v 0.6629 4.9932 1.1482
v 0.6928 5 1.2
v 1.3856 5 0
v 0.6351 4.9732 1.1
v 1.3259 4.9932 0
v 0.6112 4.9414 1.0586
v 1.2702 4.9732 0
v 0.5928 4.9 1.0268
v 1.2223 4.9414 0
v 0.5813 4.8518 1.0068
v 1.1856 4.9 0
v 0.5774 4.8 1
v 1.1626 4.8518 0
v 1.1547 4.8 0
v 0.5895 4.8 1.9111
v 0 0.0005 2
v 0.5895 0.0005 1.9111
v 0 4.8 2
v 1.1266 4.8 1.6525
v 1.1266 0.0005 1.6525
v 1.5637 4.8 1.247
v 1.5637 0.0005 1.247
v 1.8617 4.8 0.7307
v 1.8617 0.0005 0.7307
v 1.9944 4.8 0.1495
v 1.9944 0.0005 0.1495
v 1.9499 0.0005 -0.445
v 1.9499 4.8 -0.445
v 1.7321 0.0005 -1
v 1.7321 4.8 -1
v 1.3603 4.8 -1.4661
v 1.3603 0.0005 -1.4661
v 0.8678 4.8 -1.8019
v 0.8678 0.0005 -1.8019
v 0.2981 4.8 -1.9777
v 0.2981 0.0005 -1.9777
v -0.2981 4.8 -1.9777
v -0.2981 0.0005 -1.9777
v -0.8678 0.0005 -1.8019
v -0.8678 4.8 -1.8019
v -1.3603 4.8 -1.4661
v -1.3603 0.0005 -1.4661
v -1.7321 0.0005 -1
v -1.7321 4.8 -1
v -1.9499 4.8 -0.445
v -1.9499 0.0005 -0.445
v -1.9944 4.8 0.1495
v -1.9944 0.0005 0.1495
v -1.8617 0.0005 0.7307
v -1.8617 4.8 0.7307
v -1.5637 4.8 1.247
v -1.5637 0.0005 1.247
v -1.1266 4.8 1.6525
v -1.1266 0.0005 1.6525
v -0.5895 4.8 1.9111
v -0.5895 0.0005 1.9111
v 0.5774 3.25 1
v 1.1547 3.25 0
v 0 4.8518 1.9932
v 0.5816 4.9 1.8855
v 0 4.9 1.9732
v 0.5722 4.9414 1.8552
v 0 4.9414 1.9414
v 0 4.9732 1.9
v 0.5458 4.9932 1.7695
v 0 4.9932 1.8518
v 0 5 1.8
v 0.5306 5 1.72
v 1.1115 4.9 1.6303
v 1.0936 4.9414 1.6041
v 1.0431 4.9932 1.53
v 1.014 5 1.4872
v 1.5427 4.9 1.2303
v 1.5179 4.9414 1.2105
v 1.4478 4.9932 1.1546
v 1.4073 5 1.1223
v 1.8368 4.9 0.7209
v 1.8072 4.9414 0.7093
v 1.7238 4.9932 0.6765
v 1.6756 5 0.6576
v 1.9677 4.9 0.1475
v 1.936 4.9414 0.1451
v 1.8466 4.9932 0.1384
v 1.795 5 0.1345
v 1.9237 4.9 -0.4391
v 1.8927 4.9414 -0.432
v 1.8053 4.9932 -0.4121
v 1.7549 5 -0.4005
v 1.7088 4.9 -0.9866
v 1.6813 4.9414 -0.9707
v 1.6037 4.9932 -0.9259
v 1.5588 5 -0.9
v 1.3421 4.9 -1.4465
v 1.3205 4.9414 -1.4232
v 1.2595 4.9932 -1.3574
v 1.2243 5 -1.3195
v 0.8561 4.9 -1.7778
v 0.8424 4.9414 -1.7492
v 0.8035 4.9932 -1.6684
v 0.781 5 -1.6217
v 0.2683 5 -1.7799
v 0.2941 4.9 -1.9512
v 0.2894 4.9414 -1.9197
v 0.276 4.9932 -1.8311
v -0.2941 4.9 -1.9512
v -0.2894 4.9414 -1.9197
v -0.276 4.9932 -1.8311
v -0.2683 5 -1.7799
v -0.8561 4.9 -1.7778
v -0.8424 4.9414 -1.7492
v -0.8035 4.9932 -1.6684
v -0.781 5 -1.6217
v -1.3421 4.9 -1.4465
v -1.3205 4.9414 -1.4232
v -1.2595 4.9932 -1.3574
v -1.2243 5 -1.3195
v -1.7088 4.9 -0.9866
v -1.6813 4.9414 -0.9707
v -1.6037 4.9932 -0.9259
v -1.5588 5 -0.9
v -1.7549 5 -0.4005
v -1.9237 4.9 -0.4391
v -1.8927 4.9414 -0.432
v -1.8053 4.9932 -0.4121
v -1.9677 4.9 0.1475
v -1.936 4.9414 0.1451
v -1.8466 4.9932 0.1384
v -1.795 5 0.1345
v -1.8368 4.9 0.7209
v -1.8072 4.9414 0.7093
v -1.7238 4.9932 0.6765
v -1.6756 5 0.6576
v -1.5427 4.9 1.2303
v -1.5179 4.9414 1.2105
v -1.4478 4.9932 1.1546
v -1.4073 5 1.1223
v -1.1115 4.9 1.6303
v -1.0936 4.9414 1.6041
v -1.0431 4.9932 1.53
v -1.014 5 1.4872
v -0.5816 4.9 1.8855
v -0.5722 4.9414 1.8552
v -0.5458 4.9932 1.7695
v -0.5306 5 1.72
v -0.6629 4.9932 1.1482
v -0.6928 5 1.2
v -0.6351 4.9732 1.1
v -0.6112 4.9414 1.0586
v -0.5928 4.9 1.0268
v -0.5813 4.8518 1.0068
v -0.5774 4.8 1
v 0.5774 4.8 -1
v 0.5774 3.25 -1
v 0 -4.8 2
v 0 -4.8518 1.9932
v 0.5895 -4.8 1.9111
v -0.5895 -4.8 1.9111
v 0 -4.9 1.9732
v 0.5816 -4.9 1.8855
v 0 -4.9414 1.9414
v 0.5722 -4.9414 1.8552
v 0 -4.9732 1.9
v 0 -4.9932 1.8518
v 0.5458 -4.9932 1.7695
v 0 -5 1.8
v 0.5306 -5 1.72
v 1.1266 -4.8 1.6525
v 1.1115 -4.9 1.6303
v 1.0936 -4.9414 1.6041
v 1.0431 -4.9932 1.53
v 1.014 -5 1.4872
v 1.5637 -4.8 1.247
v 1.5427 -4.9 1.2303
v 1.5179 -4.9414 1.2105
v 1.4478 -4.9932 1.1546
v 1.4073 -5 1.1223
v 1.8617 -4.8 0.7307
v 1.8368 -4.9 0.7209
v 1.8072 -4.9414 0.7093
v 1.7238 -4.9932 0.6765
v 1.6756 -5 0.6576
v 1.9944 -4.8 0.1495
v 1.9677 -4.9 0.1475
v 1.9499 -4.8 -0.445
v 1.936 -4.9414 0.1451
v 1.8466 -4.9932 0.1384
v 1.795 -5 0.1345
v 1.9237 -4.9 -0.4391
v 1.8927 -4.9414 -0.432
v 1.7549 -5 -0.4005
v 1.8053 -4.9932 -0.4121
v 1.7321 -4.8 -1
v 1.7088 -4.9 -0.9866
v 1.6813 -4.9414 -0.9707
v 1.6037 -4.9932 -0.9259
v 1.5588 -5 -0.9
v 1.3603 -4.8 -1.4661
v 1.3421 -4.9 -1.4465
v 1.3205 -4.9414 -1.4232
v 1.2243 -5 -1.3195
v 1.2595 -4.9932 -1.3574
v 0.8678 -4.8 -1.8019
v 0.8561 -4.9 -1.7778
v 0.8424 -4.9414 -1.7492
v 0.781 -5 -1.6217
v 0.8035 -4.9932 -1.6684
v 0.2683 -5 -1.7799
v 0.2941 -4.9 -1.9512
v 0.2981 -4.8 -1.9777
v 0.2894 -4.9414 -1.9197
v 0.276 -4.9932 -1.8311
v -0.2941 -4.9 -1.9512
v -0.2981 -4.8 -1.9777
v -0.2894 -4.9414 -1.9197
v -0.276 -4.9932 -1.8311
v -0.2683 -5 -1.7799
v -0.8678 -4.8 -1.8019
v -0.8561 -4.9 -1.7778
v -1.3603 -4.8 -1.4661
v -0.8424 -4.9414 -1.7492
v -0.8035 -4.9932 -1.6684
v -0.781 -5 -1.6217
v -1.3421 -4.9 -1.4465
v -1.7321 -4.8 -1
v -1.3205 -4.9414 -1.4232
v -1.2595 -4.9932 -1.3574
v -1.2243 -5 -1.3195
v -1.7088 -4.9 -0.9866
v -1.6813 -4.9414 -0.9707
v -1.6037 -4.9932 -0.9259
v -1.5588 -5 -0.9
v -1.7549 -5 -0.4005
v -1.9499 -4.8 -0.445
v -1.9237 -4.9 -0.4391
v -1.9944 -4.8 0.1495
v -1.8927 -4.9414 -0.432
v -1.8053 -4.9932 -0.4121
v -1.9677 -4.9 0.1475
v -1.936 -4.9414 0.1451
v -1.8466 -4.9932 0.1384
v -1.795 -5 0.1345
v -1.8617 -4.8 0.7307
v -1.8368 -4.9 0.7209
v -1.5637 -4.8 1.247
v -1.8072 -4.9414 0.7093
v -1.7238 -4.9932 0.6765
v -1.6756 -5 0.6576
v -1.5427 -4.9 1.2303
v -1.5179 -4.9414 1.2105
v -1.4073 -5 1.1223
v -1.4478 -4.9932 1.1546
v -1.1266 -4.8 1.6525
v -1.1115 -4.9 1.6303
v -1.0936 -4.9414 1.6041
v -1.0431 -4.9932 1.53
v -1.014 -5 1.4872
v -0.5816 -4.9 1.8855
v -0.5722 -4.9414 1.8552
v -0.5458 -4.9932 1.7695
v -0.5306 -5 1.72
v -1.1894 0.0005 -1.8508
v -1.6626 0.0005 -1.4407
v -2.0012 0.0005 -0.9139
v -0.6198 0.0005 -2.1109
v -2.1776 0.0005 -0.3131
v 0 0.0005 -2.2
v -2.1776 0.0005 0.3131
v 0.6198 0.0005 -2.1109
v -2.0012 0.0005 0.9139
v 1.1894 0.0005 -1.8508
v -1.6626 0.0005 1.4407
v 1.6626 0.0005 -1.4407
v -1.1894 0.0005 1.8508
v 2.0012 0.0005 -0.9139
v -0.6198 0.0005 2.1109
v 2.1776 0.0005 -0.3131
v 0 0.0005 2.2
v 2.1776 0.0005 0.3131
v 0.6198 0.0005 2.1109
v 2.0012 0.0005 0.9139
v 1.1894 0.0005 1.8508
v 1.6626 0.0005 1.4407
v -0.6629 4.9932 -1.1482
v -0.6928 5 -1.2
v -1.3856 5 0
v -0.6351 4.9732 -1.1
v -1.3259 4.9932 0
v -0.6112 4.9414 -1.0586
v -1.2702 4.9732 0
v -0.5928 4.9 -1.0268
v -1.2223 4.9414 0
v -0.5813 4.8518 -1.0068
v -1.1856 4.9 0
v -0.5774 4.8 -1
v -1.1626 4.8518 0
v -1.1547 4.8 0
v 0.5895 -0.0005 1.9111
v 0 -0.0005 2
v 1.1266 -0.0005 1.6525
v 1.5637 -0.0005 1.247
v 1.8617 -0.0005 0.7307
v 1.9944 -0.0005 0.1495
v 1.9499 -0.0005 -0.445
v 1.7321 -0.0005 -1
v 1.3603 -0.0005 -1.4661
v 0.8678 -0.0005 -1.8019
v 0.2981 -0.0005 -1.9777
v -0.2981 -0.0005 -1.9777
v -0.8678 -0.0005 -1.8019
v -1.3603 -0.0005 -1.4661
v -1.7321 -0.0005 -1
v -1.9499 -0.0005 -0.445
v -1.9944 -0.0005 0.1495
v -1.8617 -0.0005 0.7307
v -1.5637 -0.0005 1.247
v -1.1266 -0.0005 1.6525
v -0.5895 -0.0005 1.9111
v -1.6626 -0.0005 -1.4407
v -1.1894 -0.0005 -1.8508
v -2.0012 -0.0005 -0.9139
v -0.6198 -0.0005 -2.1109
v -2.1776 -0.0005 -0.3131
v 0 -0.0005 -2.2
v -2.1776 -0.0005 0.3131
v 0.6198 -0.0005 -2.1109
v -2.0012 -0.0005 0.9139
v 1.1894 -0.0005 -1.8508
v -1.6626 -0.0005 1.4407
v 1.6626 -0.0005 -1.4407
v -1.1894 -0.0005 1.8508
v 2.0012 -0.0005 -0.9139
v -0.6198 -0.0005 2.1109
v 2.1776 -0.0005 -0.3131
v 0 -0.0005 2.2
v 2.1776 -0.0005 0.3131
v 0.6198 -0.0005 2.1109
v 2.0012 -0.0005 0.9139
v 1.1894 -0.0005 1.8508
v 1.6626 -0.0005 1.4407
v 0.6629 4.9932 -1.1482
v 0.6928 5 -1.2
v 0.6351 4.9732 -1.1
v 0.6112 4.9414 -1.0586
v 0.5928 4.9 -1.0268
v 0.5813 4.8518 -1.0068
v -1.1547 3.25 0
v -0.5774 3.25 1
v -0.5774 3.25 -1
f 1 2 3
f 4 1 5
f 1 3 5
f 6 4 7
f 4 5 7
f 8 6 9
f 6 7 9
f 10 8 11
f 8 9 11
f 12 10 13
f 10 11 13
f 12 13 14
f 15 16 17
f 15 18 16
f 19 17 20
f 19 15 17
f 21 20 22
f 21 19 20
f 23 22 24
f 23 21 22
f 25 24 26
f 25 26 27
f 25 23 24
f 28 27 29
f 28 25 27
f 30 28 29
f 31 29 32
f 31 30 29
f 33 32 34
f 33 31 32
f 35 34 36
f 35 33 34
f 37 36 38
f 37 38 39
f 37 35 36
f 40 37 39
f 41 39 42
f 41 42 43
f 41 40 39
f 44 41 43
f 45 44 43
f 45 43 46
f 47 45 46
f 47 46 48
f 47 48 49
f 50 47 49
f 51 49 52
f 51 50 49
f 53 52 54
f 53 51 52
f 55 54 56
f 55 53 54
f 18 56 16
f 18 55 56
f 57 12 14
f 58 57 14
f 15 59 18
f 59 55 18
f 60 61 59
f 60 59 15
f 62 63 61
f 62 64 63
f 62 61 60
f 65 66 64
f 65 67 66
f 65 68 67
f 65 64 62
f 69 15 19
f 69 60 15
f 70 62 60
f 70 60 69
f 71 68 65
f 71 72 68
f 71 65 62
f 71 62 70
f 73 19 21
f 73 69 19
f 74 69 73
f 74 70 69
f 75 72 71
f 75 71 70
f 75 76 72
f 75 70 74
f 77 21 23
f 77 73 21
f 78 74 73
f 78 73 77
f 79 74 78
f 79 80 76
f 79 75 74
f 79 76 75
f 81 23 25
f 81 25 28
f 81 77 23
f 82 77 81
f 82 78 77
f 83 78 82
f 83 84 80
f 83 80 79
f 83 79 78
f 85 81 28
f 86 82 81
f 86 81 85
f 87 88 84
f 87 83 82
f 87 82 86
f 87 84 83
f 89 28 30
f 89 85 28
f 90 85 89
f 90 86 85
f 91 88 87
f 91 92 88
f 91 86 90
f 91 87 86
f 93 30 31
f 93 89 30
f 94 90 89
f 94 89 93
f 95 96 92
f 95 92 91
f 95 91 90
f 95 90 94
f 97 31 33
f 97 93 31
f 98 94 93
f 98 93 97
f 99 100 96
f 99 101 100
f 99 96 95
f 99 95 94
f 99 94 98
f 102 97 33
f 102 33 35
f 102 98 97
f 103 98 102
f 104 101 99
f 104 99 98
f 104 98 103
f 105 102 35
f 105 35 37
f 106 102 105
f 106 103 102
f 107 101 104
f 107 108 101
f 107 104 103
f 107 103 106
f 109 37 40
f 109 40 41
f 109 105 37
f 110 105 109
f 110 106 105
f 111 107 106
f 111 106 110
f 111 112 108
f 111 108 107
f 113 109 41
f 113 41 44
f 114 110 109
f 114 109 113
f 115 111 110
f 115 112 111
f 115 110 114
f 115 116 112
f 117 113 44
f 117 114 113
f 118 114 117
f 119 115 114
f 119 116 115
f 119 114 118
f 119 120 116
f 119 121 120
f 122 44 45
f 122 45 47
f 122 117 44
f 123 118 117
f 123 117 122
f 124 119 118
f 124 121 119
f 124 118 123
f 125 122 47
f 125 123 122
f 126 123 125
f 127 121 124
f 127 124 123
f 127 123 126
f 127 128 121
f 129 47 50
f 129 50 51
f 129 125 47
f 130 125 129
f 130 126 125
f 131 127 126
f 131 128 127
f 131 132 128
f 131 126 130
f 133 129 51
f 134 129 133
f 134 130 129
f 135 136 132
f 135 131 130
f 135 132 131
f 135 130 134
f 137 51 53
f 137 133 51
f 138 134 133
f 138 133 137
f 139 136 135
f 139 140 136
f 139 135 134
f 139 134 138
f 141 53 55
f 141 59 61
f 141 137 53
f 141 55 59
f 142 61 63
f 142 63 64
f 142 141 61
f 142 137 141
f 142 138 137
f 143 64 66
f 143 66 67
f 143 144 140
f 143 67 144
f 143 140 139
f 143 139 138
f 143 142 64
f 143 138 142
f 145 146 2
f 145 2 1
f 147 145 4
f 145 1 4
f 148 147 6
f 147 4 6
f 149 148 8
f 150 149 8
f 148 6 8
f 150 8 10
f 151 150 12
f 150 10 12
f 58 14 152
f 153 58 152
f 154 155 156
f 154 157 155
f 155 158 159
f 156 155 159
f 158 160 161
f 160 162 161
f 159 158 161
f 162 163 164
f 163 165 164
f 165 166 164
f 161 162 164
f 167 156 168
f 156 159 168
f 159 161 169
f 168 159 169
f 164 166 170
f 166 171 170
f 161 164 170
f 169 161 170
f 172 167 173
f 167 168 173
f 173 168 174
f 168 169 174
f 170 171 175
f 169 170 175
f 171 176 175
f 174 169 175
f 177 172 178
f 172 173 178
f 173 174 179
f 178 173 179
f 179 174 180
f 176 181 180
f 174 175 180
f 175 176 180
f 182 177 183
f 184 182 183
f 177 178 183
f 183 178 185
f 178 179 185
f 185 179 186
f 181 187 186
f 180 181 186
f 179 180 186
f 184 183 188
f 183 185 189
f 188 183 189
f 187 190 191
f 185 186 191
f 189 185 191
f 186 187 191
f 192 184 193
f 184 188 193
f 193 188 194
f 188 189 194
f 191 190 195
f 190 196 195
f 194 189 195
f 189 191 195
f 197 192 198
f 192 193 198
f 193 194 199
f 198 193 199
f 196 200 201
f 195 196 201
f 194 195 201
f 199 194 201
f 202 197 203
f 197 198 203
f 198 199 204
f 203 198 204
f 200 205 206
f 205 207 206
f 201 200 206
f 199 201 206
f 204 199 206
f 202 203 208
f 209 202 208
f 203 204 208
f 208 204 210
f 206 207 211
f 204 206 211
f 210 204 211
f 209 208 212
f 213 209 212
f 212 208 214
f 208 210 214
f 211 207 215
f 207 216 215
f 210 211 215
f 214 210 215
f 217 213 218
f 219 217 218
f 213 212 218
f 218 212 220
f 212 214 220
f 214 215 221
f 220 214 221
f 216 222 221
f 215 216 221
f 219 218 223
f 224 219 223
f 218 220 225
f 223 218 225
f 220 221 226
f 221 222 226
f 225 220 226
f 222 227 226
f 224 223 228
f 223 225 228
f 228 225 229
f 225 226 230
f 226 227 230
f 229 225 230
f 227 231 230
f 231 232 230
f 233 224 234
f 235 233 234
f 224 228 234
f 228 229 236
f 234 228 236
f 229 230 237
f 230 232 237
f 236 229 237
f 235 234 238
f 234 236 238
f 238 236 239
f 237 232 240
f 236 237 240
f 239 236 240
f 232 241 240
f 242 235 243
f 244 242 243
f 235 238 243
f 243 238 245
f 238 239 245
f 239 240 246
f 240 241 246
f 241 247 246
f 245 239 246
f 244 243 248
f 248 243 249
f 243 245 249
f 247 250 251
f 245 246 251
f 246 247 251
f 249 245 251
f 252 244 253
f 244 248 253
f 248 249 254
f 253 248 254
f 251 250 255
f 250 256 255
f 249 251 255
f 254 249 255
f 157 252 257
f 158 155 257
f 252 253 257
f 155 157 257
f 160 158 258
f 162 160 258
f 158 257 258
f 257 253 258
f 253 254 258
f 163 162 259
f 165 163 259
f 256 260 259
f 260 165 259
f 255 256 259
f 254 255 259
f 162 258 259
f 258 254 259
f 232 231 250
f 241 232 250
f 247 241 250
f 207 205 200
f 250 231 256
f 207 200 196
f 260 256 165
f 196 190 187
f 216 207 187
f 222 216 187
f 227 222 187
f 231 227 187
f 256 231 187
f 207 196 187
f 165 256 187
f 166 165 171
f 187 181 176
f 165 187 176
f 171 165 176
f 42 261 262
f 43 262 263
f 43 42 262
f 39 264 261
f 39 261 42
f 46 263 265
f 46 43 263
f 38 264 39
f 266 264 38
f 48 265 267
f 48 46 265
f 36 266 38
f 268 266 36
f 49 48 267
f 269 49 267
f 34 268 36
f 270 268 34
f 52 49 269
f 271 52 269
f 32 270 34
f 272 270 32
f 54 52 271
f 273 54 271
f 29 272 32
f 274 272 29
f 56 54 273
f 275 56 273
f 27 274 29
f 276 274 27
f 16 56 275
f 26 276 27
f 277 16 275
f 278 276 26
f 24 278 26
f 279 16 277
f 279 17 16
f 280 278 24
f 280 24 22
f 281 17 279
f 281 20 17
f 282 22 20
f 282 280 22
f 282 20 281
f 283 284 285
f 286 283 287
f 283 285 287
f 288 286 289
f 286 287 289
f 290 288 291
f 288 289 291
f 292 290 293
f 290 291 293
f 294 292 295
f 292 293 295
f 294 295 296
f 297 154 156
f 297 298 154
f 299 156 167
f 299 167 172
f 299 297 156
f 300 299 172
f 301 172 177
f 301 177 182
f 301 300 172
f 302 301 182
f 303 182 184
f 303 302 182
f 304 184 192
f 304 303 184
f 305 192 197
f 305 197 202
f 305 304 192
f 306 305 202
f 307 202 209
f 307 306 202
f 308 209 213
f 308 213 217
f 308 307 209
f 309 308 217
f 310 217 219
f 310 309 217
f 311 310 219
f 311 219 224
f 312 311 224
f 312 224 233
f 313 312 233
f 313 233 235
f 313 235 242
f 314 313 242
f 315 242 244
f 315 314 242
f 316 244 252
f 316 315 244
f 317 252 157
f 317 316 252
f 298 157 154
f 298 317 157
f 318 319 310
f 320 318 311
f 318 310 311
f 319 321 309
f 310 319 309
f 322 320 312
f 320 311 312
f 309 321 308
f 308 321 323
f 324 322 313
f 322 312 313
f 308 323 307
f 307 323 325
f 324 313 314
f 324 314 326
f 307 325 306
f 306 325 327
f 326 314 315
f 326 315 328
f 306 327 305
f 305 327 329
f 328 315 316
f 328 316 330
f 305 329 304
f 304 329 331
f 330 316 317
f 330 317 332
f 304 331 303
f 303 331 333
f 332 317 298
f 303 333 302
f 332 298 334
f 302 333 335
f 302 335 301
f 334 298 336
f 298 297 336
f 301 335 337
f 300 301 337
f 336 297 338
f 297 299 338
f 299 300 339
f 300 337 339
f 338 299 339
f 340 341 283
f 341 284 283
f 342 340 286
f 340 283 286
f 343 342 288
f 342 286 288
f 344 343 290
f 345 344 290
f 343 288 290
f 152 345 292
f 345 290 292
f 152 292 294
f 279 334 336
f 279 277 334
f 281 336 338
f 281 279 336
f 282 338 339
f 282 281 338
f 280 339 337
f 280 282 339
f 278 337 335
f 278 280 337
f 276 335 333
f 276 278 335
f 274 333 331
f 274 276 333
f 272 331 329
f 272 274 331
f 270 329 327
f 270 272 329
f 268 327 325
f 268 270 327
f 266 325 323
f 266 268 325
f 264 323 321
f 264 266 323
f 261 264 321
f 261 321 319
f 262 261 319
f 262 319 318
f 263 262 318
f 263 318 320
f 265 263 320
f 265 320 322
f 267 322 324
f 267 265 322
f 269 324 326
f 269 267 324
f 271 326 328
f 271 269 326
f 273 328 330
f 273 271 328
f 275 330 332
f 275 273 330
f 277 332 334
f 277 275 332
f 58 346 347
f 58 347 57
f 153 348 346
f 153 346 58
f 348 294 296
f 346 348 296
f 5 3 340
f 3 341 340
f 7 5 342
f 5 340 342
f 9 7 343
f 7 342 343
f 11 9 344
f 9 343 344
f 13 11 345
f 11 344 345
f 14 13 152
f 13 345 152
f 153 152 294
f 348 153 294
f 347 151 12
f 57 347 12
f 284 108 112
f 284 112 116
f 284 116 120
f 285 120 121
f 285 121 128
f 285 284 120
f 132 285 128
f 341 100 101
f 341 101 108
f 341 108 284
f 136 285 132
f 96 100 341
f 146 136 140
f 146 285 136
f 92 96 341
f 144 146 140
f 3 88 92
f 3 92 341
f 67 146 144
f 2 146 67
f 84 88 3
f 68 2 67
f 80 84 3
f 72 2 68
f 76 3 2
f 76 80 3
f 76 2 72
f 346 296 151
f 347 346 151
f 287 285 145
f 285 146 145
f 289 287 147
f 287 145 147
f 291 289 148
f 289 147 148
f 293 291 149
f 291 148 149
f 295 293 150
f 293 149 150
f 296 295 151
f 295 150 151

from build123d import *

# Parameters (mm, degrees)
SKETCH_1_R          = 2
EXTRUDE_1_DEPTH     = 5
CUT_EXTRUDE_1_DEPTH = 1.75
FILLET_1_R          = 0.2
SKETCH_2_R          = 2.2
EXTRUDE_2_DEPTH     = 0.0005


with BuildPart() as part:
    # 草图1 → 凸台-拉伸1 (new, symmetric)
    with BuildSketch(Plane(origin=(0, 0, 0), x_dir=(1, 0, 0), z_dir=(0, 1, 0))):
        with Locations(Location((0, 0, 0), (0, 0, 270))):
            Circle(SKETCH_1_R)
    extrude(amount=EXTRUDE_1_DEPTH, both=True)

    # 草图3 → 切除-拉伸1 (cut)
    with BuildSketch(Plane(origin=(0, 5, 0), x_dir=(1, 0, 0), z_dir=(0, 1, 0))):
        Polygon((1.154700538, 0), (0.577350269, 1), (-0.577350269, 1), (-1.154700538, 0), (-0.577350269, -1), (0.577350269, -1), align=None)
    extrude(amount=-CUT_EXTRUDE_1_DEPTH, mode=Mode.SUBTRACT)

    # 圆角1
    fillet_1_edges = [part.edges().sort_by_distance(p)[0] for p in [
        (0.866025404, 5, 0.5),
        (0.866025404, 5, -0.5),
        (0, 5, -1),
        (-0.866025404, 5, -0.5),
        (-0.866025404, 5, 0.5),
        (0, 5, 1),
        (0, -5, -2),
        (0, 5, -2),
    ]]
    fillet(fillet_1_edges, radius=FILLET_1_R)

    # 草图2 → 凸台-拉伸2 (add, symmetric)
    with BuildSketch(Plane(origin=(0, 0, 0), x_dir=(1, 0, 0), z_dir=(0, 1, 0))):
        with Locations(Location((0, 0, 0), (0, 0, 270))):
            Circle(SKETCH_2_R)
    extrude(amount=EXTRUDE_2_DEPTH, both=True)


solid = part.part
